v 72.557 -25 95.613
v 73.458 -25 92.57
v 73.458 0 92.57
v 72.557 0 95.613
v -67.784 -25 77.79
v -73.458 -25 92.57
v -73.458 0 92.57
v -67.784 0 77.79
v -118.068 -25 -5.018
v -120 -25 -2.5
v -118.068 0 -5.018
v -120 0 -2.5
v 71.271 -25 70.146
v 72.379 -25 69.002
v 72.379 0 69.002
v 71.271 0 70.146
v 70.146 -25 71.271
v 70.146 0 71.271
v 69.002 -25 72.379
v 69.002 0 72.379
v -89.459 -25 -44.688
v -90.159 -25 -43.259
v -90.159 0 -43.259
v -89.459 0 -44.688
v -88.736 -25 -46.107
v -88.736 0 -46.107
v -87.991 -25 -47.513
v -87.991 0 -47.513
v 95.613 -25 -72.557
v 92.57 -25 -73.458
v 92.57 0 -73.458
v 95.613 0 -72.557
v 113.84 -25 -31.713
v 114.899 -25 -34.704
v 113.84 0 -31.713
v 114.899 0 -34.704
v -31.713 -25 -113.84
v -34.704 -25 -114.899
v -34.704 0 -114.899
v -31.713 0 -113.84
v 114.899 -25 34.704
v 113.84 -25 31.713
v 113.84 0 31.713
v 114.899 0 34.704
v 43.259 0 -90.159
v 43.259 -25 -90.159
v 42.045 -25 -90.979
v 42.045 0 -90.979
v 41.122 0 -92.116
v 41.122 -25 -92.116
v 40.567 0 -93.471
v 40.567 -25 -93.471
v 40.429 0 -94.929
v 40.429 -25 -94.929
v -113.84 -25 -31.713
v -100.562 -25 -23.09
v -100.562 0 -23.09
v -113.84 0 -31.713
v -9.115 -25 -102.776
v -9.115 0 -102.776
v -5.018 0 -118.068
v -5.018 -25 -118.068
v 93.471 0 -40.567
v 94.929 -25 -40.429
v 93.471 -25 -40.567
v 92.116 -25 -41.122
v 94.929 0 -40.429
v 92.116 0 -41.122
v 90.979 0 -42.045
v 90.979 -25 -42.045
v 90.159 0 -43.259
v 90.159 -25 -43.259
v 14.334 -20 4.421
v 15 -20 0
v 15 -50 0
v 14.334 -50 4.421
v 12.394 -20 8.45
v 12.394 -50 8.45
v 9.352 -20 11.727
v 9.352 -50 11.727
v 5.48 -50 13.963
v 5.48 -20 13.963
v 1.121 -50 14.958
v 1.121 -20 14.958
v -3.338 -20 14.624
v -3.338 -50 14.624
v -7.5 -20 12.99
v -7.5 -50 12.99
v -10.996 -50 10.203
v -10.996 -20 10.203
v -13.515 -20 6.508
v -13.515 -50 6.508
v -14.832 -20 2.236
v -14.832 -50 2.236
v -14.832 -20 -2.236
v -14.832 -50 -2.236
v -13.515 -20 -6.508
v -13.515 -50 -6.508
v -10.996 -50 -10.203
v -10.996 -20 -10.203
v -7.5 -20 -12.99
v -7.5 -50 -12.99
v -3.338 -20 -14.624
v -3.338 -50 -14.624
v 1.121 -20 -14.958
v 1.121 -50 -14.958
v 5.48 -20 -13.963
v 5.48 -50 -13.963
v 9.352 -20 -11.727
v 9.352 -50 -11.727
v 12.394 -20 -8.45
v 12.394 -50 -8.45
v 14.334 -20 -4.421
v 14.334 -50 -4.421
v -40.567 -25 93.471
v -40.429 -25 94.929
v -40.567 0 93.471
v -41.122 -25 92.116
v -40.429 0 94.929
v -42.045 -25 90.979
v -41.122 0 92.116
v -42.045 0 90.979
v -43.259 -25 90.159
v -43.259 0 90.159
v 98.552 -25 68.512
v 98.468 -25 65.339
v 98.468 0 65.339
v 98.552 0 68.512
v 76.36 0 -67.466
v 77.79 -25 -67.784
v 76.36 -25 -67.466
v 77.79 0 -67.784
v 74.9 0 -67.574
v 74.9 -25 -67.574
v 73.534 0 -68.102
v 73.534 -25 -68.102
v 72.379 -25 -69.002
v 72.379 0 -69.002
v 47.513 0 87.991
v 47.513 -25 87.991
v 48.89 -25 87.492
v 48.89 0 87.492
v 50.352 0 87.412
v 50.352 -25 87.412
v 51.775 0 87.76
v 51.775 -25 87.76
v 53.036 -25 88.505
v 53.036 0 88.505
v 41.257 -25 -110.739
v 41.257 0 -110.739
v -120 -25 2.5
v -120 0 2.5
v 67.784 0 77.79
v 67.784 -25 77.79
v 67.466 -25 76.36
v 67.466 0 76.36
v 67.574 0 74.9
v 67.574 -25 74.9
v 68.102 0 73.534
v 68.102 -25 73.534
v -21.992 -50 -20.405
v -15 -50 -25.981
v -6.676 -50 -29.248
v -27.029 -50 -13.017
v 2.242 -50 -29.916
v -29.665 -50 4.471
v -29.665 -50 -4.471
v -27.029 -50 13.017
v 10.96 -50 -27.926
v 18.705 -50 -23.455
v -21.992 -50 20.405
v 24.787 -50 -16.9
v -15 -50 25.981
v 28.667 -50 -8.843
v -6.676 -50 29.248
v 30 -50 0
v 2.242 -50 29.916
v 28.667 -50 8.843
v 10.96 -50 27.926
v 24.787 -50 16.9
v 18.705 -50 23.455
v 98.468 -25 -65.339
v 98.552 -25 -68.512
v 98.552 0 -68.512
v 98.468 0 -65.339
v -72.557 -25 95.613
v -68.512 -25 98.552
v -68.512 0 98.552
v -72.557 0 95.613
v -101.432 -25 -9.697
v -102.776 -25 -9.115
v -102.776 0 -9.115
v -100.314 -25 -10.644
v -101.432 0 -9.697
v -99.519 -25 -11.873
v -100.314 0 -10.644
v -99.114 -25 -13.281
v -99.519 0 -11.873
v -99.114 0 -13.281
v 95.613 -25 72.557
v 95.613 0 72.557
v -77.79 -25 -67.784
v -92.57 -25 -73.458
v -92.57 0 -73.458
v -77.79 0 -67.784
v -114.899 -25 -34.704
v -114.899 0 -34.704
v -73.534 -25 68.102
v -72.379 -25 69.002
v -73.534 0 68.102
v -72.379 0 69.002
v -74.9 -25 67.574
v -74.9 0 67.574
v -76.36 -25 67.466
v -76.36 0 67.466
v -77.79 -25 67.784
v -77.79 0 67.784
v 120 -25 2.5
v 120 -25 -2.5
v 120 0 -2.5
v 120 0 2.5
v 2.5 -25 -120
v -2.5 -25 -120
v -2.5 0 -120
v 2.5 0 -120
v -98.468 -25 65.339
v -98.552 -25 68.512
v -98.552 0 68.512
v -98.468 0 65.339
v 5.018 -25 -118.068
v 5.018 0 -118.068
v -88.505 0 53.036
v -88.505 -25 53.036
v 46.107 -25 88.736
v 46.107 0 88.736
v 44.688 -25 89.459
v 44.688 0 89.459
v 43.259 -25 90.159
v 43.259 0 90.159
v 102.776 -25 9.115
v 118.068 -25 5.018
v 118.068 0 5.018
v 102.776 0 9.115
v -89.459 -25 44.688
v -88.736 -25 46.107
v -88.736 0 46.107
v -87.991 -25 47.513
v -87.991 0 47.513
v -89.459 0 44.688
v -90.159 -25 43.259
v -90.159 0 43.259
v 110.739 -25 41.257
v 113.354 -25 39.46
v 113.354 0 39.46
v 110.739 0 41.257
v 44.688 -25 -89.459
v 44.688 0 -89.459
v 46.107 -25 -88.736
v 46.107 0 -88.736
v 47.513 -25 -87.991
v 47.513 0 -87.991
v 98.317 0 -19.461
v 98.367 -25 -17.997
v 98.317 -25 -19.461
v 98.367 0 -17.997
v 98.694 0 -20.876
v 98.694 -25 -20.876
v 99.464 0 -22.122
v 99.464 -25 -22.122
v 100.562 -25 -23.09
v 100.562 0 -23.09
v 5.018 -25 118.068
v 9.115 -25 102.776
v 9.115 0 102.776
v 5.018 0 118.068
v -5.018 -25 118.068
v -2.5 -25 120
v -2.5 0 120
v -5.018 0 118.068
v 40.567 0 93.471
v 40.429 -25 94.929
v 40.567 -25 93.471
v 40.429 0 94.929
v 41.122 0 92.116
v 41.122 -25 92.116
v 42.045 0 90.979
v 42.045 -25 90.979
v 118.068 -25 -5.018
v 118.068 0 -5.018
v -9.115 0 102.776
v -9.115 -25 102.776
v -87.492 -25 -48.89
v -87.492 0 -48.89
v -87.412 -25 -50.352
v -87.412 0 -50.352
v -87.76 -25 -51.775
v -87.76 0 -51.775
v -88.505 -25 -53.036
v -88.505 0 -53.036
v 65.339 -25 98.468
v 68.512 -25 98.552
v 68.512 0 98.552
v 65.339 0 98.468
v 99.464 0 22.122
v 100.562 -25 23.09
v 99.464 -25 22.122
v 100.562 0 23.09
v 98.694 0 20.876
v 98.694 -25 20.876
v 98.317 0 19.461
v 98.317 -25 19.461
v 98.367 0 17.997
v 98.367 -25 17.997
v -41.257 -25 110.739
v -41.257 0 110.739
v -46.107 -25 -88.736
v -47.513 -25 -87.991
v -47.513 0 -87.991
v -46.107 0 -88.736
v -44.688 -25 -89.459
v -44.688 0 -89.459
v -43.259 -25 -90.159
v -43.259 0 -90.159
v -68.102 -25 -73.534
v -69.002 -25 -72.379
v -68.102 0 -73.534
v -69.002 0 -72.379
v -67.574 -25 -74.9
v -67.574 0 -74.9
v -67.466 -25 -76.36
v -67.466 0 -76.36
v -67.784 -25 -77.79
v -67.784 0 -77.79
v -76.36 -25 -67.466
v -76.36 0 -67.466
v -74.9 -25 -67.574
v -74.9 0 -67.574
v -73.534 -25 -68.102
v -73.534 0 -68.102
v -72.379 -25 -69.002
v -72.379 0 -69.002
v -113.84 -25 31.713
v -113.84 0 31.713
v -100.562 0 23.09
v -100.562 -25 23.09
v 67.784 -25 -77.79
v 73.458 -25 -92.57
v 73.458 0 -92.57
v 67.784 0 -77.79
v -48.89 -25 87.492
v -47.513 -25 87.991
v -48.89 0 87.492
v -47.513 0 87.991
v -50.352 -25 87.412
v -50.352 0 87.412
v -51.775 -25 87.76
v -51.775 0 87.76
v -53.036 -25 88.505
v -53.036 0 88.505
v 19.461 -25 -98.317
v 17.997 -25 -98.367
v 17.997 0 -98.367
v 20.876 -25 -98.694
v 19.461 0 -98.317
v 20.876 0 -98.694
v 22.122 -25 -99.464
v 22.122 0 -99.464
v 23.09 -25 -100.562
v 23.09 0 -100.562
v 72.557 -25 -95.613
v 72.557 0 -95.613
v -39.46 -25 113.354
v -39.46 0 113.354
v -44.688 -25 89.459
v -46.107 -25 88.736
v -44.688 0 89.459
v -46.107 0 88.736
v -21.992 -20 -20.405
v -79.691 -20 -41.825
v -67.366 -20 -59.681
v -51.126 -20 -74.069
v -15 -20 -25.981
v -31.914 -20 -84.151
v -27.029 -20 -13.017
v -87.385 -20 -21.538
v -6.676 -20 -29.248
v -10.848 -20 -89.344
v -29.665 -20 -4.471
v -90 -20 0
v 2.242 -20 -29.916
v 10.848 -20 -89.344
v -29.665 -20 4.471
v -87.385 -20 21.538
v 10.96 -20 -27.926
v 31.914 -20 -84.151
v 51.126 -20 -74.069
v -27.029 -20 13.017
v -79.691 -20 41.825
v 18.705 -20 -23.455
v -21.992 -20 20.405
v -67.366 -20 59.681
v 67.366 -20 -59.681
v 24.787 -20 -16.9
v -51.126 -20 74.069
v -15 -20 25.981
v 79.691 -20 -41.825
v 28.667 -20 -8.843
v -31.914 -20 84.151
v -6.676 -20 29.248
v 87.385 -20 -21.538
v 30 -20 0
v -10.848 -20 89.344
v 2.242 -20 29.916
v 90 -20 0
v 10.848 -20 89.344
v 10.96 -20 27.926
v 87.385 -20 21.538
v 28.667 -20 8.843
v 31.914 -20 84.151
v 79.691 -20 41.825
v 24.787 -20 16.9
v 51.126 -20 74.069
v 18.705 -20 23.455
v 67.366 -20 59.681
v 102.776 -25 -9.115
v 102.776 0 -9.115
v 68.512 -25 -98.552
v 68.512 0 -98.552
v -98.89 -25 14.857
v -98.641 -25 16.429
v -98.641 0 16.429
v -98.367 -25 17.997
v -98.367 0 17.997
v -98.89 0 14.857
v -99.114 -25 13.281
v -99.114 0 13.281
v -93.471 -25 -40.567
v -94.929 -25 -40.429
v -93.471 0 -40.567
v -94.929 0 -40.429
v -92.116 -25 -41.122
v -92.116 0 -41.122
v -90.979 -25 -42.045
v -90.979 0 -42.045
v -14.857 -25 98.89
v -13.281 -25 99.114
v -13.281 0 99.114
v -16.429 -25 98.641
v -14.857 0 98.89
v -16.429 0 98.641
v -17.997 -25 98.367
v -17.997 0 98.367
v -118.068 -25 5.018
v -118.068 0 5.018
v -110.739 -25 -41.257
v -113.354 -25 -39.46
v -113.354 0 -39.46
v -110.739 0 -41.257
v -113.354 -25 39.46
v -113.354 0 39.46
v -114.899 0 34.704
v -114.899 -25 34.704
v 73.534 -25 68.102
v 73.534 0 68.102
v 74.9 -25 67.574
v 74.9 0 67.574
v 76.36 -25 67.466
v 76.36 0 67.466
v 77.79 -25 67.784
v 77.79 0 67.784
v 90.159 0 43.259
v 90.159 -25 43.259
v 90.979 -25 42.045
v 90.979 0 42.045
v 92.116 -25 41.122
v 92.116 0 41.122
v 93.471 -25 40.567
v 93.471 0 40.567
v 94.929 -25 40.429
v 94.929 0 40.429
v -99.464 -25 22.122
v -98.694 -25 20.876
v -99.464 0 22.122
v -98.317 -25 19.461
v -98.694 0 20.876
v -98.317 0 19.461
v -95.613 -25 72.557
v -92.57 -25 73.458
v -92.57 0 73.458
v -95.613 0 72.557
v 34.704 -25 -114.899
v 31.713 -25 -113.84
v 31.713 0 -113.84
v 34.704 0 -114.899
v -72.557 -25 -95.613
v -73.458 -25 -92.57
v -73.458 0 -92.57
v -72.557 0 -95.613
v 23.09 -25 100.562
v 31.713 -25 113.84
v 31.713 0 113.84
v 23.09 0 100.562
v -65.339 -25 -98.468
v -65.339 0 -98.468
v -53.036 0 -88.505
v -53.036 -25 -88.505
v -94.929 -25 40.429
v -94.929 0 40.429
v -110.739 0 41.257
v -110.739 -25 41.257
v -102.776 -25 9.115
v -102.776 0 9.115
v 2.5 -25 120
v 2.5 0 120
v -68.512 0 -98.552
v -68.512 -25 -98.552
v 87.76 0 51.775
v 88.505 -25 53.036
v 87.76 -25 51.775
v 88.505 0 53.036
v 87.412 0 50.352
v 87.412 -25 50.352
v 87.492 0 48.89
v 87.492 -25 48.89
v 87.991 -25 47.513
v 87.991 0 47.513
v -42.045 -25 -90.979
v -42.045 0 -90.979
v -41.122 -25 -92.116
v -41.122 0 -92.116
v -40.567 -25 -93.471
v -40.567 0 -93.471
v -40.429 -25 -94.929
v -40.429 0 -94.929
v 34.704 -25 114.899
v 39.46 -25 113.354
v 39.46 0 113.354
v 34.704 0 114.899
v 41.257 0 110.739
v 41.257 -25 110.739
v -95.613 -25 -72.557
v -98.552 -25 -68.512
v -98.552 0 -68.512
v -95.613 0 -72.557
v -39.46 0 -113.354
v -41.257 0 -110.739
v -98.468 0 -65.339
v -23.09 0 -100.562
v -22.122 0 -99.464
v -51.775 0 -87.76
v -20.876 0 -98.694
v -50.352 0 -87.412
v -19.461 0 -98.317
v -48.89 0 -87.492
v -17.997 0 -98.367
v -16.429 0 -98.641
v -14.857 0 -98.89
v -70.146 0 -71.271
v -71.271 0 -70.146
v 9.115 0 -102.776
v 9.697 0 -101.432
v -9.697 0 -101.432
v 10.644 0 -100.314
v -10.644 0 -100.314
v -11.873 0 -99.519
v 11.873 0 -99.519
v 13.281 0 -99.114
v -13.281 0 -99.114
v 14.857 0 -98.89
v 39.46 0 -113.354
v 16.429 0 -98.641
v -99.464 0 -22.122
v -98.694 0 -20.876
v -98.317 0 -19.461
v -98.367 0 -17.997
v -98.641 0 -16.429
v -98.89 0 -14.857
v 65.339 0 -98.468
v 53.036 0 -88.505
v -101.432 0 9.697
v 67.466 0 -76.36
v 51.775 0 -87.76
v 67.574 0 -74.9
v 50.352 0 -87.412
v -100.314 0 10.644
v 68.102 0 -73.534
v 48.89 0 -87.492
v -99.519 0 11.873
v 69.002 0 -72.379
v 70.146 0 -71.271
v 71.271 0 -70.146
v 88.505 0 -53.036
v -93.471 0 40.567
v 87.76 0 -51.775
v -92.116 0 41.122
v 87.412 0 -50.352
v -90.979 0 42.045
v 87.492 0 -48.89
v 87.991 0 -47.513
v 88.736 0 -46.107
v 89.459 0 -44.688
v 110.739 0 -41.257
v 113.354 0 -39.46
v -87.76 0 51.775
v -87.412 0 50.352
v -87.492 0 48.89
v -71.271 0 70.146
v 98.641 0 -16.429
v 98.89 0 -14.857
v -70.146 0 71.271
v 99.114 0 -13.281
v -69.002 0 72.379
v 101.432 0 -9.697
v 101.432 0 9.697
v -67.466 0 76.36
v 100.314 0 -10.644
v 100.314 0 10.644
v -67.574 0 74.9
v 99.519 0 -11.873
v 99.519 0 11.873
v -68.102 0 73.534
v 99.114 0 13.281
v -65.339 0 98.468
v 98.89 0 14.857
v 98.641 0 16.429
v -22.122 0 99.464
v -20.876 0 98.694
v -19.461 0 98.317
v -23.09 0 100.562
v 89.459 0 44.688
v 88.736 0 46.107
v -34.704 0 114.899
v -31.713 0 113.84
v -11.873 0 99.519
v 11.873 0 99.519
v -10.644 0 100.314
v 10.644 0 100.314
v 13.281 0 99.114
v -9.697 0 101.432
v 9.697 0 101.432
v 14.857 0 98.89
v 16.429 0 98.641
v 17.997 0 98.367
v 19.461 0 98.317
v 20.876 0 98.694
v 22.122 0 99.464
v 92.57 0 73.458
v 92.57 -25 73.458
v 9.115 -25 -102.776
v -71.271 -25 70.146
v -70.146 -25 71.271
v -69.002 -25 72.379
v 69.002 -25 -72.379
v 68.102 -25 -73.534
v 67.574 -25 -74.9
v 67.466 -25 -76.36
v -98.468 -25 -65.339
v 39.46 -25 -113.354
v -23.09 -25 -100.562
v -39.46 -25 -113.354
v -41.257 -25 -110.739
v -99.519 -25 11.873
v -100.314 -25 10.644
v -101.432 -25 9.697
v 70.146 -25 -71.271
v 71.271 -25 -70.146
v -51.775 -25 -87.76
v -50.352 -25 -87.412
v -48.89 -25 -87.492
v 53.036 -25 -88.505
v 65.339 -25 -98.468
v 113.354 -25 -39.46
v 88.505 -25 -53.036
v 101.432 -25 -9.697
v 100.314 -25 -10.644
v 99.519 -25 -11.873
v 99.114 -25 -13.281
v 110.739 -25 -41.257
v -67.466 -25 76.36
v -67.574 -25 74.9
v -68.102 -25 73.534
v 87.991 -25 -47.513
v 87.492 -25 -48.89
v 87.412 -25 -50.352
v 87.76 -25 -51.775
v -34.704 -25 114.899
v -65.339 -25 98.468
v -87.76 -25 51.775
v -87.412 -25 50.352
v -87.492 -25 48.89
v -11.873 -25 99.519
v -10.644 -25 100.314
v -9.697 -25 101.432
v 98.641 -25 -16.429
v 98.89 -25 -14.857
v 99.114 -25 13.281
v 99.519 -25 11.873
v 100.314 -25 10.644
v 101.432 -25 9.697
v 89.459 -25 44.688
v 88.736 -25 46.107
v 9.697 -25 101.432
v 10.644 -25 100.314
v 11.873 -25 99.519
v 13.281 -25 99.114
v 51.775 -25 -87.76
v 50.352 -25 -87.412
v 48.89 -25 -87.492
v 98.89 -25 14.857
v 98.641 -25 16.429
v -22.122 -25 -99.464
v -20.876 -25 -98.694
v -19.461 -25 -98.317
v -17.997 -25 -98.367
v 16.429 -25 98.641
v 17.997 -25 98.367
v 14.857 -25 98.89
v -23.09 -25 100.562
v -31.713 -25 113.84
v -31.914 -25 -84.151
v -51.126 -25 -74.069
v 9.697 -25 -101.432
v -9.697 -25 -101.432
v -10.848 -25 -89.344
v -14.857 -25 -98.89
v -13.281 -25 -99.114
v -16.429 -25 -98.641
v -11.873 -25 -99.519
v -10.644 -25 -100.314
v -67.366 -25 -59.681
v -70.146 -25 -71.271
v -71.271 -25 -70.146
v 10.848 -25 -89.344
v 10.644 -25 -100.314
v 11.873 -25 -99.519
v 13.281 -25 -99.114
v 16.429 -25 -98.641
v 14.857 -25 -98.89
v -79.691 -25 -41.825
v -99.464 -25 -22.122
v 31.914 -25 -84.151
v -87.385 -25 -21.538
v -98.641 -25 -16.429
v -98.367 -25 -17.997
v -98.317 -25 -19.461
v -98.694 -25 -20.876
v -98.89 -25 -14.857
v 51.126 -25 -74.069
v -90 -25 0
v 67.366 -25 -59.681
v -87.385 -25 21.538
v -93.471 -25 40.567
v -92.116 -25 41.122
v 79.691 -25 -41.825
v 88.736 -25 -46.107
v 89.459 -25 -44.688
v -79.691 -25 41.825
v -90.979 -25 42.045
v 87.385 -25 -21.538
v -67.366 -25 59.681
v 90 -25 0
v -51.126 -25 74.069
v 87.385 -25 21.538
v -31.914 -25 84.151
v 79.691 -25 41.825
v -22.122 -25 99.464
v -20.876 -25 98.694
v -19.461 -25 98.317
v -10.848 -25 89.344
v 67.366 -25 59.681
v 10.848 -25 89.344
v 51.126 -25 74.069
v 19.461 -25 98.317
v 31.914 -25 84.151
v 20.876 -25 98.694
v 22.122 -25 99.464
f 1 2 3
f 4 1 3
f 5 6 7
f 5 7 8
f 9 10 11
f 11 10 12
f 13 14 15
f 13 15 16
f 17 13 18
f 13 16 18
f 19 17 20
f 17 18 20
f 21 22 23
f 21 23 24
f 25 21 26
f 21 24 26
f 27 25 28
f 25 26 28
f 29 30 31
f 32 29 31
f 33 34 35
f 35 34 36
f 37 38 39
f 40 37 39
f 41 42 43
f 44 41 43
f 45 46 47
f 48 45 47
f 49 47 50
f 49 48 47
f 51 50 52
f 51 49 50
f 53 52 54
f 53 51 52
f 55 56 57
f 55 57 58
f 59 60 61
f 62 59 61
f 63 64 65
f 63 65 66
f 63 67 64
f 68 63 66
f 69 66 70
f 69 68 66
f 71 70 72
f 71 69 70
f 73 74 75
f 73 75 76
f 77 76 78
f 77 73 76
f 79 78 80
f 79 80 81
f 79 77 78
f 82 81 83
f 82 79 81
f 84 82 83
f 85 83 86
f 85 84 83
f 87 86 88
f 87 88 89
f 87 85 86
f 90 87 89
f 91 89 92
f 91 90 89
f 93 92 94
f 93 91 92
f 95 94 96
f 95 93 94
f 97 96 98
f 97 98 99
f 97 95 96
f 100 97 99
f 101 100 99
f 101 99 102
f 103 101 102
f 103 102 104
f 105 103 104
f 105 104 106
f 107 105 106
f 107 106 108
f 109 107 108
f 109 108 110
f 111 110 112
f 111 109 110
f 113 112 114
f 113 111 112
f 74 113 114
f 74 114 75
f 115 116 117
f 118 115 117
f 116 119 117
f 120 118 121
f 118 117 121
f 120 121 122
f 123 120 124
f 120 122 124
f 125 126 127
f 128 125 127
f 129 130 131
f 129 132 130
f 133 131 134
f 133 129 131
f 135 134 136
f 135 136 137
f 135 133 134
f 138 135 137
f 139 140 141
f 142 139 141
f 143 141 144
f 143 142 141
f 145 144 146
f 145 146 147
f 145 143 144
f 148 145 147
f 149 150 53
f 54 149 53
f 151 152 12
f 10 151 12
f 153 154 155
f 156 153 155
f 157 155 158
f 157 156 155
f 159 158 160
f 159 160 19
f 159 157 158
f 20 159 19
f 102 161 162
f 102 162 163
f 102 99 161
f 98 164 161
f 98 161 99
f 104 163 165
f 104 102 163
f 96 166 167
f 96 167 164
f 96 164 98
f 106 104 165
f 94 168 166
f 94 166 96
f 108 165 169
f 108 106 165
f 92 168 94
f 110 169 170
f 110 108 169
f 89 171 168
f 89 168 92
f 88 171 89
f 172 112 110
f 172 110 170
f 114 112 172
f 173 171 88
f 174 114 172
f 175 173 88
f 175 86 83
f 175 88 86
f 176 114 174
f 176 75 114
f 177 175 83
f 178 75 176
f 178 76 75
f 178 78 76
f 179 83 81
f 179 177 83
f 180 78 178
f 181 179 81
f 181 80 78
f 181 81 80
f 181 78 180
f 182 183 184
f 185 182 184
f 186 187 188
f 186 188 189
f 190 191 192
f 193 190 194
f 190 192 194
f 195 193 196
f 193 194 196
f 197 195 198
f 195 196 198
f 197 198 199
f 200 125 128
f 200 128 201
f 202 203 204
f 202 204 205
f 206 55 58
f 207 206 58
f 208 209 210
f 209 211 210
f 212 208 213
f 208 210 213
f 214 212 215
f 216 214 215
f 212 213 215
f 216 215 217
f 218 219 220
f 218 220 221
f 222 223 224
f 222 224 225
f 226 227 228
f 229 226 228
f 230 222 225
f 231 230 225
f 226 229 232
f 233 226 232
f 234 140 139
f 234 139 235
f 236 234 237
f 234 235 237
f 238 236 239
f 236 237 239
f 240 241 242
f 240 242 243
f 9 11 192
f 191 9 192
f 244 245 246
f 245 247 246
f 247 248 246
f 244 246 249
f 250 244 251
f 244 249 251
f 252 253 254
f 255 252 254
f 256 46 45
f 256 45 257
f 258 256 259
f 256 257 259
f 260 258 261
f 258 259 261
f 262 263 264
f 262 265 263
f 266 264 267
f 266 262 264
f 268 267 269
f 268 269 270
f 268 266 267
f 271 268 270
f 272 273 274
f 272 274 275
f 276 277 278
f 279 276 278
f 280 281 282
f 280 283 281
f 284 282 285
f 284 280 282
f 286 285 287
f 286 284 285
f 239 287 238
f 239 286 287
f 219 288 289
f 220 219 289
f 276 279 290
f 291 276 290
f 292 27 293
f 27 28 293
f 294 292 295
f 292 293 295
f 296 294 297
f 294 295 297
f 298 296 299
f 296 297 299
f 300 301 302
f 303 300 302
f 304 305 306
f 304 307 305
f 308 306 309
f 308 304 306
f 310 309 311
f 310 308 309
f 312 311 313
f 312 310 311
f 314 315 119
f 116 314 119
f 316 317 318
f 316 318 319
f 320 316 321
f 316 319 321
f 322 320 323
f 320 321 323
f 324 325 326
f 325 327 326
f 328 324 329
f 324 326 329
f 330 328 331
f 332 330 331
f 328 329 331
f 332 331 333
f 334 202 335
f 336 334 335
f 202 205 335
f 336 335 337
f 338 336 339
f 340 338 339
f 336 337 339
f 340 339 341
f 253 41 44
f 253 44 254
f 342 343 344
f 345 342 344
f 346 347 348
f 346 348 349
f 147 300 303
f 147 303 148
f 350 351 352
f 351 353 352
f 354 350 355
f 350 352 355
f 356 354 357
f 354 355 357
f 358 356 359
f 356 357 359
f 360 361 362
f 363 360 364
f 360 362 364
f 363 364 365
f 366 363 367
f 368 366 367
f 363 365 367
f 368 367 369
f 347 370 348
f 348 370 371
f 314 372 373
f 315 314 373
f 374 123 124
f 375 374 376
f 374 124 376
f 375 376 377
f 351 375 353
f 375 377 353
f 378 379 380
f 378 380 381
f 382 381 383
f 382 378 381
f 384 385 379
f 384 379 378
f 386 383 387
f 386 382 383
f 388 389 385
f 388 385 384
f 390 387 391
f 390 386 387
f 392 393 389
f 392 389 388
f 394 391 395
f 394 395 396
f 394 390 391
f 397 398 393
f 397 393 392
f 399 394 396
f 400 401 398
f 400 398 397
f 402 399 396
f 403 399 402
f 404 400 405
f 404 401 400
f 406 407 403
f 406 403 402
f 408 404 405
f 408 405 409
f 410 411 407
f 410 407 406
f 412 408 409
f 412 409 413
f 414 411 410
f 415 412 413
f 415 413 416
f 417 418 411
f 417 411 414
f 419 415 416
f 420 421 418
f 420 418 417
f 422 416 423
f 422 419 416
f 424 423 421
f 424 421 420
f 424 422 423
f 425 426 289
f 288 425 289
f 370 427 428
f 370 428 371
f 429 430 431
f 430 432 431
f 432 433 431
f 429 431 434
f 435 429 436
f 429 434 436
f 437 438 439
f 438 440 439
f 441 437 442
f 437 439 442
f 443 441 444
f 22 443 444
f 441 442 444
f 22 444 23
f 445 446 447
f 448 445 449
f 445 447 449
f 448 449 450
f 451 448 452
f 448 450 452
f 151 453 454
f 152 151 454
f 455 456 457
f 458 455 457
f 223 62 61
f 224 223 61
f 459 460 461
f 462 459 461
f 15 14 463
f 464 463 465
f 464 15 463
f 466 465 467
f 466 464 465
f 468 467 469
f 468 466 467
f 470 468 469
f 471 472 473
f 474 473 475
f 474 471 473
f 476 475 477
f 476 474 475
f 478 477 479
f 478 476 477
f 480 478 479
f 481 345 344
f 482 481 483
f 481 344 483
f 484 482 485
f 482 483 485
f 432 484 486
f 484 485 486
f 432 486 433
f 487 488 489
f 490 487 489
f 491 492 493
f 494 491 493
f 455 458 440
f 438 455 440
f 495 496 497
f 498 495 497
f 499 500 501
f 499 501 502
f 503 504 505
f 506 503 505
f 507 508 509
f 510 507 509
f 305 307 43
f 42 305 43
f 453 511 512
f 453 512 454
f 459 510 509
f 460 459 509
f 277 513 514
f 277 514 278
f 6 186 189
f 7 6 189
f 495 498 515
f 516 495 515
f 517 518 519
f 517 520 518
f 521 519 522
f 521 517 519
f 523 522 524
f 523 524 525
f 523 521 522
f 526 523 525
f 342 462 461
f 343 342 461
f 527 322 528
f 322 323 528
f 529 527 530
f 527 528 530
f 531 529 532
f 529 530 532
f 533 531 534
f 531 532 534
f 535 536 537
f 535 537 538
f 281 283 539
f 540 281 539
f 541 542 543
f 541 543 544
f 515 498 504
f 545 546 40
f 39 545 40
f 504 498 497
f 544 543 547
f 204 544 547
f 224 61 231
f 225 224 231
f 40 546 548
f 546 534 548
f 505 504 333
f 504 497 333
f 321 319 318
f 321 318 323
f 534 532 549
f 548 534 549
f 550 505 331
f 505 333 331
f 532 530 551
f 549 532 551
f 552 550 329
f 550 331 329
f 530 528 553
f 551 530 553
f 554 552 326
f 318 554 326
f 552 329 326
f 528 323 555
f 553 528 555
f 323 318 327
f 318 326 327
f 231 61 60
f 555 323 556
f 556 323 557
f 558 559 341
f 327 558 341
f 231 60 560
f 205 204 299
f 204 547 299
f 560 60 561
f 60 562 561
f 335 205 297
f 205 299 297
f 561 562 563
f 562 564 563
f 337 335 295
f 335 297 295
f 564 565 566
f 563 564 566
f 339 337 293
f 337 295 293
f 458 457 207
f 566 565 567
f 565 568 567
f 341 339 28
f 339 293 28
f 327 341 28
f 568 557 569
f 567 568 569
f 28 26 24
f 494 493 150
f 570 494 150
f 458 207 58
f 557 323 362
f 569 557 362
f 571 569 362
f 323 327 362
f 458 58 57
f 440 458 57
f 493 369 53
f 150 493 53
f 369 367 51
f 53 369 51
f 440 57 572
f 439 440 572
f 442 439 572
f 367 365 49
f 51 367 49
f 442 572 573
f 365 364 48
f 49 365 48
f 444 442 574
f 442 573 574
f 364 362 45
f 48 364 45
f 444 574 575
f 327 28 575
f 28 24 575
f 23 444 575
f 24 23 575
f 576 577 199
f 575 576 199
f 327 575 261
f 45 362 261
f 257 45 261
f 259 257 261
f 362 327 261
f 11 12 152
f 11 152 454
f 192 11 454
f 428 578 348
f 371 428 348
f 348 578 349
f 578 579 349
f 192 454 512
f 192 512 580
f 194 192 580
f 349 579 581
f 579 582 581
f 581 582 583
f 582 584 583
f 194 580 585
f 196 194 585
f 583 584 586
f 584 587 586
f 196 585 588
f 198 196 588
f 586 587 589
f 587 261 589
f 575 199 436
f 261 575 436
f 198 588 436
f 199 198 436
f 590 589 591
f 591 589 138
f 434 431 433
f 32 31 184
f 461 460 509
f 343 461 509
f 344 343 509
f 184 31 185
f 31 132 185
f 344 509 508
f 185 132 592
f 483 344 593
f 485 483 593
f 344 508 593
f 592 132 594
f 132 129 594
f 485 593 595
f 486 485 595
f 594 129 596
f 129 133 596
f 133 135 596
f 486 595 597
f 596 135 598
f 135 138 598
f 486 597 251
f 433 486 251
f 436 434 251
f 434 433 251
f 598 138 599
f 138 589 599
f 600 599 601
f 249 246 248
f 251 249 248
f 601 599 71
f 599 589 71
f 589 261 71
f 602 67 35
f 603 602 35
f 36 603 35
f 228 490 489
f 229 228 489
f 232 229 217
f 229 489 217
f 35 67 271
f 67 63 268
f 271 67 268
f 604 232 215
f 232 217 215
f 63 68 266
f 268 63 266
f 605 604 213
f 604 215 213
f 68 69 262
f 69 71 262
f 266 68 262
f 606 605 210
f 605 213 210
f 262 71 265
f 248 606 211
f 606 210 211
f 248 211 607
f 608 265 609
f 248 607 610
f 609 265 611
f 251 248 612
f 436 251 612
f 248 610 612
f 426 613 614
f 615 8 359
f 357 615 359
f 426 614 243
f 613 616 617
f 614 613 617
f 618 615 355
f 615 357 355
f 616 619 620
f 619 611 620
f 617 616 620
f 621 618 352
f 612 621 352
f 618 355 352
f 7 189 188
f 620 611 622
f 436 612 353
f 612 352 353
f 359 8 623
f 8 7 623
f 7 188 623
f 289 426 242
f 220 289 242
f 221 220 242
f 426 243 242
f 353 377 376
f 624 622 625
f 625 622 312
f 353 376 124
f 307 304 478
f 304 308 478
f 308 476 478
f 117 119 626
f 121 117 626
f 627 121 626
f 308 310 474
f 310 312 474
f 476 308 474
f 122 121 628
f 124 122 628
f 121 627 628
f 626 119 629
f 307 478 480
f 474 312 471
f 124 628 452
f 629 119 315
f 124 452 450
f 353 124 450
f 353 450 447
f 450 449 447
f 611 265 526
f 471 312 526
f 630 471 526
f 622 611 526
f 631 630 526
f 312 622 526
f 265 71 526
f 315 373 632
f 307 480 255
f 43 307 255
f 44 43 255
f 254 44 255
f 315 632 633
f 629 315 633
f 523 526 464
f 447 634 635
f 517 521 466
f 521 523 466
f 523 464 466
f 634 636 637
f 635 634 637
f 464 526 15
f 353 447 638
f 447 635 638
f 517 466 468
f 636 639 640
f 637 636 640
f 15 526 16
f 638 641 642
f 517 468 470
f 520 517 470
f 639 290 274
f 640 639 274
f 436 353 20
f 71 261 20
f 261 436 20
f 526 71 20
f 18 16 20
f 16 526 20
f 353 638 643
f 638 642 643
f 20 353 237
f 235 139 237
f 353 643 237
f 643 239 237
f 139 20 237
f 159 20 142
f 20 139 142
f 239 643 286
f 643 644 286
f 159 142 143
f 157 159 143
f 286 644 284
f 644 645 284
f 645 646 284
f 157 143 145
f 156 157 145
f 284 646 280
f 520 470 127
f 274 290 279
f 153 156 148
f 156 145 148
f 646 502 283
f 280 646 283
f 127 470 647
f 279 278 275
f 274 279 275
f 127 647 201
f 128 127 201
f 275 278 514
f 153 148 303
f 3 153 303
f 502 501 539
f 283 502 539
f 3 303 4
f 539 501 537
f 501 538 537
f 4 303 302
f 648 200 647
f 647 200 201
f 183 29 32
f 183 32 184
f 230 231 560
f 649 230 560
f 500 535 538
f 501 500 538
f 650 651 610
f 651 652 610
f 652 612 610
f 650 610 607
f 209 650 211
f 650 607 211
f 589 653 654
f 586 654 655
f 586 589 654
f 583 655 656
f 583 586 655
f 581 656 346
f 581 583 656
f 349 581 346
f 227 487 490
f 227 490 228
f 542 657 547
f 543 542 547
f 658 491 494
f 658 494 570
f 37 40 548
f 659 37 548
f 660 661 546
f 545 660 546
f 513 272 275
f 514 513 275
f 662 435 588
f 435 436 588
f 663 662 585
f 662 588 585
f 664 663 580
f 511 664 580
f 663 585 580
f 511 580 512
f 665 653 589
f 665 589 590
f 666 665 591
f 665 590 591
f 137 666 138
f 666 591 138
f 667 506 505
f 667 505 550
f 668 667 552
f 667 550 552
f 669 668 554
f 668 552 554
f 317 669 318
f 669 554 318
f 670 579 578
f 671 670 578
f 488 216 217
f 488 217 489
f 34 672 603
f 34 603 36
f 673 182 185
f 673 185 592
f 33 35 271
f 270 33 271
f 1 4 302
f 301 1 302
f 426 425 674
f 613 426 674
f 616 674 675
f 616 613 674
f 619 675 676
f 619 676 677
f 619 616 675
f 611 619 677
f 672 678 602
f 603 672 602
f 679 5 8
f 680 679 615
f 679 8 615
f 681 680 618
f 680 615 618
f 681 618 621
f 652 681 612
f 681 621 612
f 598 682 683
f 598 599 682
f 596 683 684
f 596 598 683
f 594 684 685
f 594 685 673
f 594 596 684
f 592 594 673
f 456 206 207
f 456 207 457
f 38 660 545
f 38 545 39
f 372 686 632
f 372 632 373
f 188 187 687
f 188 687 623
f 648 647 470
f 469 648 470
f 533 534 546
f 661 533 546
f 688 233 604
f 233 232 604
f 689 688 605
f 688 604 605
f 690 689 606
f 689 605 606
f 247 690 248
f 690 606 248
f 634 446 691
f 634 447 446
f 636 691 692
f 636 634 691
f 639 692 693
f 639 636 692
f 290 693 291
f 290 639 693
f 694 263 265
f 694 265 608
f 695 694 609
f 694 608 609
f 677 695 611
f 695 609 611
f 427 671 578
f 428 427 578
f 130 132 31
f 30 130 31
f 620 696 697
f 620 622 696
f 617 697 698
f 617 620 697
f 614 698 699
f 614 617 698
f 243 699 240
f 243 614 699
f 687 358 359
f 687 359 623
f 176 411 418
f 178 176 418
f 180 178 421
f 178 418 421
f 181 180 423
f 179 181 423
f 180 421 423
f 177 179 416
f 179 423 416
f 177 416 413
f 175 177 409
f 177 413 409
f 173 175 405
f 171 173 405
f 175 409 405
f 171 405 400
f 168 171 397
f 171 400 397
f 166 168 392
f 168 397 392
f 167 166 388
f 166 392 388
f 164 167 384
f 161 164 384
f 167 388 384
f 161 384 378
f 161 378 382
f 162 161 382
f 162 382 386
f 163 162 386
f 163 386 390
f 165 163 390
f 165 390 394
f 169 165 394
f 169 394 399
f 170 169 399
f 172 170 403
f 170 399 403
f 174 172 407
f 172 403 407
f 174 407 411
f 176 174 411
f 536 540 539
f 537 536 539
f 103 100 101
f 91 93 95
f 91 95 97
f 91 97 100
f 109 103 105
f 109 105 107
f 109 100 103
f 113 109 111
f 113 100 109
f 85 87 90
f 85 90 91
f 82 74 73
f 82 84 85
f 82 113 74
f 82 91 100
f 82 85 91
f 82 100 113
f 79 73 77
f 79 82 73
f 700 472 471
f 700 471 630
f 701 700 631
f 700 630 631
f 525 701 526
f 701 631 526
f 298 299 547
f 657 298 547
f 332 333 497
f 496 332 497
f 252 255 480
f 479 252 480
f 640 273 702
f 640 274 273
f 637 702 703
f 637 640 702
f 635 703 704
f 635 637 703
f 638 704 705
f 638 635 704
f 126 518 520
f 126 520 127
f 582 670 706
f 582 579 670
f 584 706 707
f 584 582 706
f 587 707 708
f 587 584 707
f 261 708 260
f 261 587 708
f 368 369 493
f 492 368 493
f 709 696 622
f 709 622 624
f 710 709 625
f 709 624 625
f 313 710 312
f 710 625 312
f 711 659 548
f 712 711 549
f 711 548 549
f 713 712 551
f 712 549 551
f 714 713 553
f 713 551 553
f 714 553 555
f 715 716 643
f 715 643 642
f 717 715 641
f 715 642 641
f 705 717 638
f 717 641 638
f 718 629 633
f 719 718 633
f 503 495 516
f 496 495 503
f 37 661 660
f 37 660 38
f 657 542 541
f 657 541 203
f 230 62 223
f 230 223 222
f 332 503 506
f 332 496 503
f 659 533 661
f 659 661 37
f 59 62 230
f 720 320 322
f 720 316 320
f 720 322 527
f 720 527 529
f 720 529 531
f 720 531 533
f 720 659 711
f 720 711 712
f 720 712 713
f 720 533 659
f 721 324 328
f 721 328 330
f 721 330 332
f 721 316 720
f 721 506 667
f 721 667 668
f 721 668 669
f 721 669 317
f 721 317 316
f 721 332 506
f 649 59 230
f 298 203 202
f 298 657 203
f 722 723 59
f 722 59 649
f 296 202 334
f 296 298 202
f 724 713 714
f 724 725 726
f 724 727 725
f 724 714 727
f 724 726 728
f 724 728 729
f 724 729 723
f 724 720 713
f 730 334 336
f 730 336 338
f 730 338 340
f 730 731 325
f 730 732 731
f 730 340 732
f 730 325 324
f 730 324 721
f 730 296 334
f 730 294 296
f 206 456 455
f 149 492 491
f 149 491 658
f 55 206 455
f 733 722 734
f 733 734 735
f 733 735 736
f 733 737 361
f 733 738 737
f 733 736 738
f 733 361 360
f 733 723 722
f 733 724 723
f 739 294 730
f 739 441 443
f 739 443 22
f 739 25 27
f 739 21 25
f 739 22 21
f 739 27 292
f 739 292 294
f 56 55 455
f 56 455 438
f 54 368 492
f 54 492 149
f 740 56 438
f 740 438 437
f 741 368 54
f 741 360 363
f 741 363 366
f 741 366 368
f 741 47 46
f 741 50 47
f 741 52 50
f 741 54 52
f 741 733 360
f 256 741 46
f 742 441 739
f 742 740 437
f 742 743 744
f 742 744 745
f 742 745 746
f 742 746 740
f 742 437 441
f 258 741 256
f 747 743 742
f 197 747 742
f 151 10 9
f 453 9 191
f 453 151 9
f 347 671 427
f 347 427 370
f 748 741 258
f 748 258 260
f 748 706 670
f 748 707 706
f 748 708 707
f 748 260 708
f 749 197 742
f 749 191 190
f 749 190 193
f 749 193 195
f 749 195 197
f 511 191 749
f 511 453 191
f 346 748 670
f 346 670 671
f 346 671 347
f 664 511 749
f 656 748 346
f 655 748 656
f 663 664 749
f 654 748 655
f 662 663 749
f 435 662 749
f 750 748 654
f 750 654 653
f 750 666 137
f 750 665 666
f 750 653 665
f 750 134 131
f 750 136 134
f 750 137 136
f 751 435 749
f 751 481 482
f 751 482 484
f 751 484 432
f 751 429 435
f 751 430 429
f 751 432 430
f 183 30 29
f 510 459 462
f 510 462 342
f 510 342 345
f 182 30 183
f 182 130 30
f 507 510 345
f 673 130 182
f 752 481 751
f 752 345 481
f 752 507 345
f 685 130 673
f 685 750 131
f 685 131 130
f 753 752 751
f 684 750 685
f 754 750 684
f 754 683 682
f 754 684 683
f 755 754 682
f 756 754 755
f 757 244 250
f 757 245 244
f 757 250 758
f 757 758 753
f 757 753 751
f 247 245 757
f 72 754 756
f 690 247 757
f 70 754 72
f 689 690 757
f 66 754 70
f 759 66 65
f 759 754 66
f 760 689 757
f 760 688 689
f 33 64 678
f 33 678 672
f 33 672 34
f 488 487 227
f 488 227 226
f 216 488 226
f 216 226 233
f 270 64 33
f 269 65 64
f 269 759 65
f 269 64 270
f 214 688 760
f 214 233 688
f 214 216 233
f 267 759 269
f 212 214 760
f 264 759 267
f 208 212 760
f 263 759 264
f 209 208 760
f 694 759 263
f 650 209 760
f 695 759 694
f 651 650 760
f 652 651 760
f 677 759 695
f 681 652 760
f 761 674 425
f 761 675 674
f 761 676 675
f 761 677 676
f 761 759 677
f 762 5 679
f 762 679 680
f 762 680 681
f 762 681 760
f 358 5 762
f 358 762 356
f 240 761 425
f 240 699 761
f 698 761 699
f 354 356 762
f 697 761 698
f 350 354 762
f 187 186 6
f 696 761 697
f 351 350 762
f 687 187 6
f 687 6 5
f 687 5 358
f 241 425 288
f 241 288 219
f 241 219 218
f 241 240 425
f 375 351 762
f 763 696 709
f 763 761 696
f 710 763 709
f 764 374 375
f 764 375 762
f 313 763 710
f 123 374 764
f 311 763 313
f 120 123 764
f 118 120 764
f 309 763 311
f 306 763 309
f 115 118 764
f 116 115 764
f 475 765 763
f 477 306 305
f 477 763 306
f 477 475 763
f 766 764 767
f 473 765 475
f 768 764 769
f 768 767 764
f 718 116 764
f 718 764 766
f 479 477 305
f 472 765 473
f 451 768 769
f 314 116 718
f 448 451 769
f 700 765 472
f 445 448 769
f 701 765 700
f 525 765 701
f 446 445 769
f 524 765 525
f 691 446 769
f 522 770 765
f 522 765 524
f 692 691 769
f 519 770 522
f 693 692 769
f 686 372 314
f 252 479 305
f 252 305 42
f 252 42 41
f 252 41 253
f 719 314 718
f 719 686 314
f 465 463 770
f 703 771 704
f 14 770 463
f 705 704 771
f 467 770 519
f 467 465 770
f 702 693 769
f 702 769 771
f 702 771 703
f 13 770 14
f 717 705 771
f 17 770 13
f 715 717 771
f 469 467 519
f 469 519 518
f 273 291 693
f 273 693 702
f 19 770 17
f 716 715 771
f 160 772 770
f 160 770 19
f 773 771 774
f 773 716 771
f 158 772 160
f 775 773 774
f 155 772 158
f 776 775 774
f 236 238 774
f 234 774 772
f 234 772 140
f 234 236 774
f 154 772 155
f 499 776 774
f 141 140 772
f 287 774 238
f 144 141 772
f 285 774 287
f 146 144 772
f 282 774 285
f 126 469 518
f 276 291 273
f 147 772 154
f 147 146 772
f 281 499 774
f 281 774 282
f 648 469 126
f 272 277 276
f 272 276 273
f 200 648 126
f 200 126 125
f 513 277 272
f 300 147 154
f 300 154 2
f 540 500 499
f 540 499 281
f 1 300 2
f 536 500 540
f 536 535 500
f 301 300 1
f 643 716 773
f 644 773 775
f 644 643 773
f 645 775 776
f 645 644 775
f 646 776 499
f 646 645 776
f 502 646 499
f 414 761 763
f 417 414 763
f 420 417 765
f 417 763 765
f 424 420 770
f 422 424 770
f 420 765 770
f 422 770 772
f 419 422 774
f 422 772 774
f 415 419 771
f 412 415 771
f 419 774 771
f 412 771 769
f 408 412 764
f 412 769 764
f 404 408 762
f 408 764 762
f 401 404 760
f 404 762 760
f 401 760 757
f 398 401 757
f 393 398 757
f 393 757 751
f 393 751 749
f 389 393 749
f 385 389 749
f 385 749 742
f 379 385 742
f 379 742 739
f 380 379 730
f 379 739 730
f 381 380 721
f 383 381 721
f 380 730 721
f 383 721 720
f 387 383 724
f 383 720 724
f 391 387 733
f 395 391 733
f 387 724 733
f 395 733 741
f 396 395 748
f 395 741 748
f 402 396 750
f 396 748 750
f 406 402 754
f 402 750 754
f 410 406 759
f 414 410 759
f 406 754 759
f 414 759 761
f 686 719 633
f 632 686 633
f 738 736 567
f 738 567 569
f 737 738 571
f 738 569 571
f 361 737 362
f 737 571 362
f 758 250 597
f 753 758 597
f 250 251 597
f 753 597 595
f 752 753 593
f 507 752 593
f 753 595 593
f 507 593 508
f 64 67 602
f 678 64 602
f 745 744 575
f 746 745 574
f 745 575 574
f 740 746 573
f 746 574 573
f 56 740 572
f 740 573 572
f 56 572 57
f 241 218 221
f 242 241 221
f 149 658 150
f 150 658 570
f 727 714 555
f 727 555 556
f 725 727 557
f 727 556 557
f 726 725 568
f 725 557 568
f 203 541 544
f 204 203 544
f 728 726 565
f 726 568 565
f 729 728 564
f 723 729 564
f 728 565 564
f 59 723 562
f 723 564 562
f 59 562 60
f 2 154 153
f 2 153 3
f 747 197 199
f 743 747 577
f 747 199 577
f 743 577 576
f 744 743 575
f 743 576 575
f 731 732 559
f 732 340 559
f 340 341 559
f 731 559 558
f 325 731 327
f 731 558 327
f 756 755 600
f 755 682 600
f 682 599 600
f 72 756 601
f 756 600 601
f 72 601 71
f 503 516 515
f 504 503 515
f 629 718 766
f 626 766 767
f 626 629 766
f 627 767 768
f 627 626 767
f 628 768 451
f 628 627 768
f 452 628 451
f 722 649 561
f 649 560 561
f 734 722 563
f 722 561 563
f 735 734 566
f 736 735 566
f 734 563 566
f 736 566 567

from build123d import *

# Parameters (mm, degrees)
F0_R            = 100
F1_DEPTH        = 25
F3_DEPTH        = 25
F3_COPIES_COUNT = 20
F4_SIZE         = 2
F5_R            = 5
F6_R            = 90
F7_DEPTH        = 5
F8_R            = 30
F8_R_2          = 15
F9_DEPTH        = 30


# Not quite as in the source:
# - a pattern or mirror of a feature is missing from the dataset's text; its kind, count and spacing are read off the source's solid


with BuildPart() as f1:
    # F0 (on Front) → F1 (new body)
    with BuildSketch(Plane.XZ):
        Circle(F0_R)
    extrude(amount=F1_DEPTH)

    # F2 (on face) → F3 (join)
    with BuildSketch(Plane.XZ.offset(25)):
        Polygon((-4.5, 120), (-9.9931095726, 99.4994359837), (9.9931095726, 99.4994359837), (4.5, 120), align=None)
    f3 = extrude(amount=-F3_DEPTH)

    # F3_copies: F3 ×20 about axis
    f3_copies_axis = Axis((0, 0, 0), (0, 1, 0))
    for i in range(1, F3_COPIES_COUNT):
        add(f3.rotate(f3_copies_axis, i * 360 / F3_COPIES_COUNT))

    # F4
    f4_edges = [f1.edges().sort_by_distance(p)[0] for p in [
        (4.5, -12.5, 120),
        (-4.5, -12.5, 120),
        (-32.802285, -12.5, 115.517358),
        (115.517358, -12.5, 32.802285),
        (120, -12.5, 4.5),
        (120, -12.5, -4.5),
        (115.517358, -12.5, -32.802285),
        (112.736205, -12.5, -41.361794),
        (99.727073, -12.5, -66.893654),
        (94.437006, -12.5, -74.174807),
        (74.174807, -12.5, -94.437006),
        (66.893654, -12.5, -99.727073),
        (41.361794, -12.5, -112.736205),
        (32.802285, -12.5, -115.517358),
        (4.5, -12.5, -120),
        (-4.5, -12.5, -120),
        (-32.802285, -12.5, -115.517358),
        (-41.361794, -12.5, -112.736205),
        (-66.893654, -12.5, -99.727073),
        (-74.174807, -12.5, -94.437006),
        (-94.437006, -12.5, -74.174807),
        (-99.727073, -12.5, -66.893654),
        (-112.736205, -12.5, -41.361794),
        (-115.517358, -12.5, -32.802285),
        (-120, -12.5, -4.5),
        (-120, -12.5, 4.5),
        (-115.517358, -12.5, 32.802285),
        (-112.736205, -12.5, 41.361794),
        (-99.727073, -12.5, 66.893654),
        (-94.437006, -12.5, 74.174807),
        (-74.174807, -12.5, 94.437006),
        (-66.893654, -12.5, 99.727073),
        (32.802285, -12.5, 115.517358),
        (41.361794, -12.5, 112.736205),
        (66.893654, -12.5, 99.727073),
        (74.174807, -12.5, 94.437006),
        (94.437006, -12.5, 74.174807),
        (99.727073, -12.5, 66.893654),
        (112.736205, -12.5, 41.361794),
        (-41.361794, -12.5, 112.736205),
    ]]
    chamfer(f4_edges, length=F4_SIZE)

    # F5
    f5_edges = [f1.edges().sort_by_distance(p)[0] for p in [
        (9.99311, -12.5, 99.499436),
        (-9.99311, -12.5, 99.499436),
        (97.717628, -12.5, 21.243005),
        (99.499436, -12.5, 9.99311),
        (91.541546, -12.5, 40.251029),
        (86.370537, -12.5, 50.399706),
        (99.499436, -12.5, -9.99311),
        (97.717628, -12.5, -21.243005),
        (74.622932, -12.5, 66.568897),
        (66.568897, -12.5, 74.622932),
        (91.541546, -12.5, -40.251029),
        (86.370537, -12.5, -50.399706),
        (50.399706, -12.5, 86.370537),
        (40.251029, -12.5, 91.541546),
        (74.622932, -12.5, -66.568897),
        (66.568897, -12.5, -74.622932),
        (21.243005, -12.5, 97.717628),
        (50.399706, -12.5, -86.370537),
        (40.251029, -12.5, -91.541546),
        (-21.243005, -12.5, 97.717628),
        (21.243005, -12.5, -97.717628),
        (9.99311, -12.5, -99.499436),
        (-40.251029, -12.5, 91.541546),
        (-50.399706, -12.5, 86.370537),
        (-9.99311, -12.5, -99.499436),
        (-21.243005, -12.5, -97.717628),
        (-66.568897, -12.5, 74.622932),
        (-74.622932, -12.5, 66.568897),
        (-40.251029, -12.5, -91.541546),
        (-50.399706, -12.5, -86.370537),
        (-86.370537, -12.5, 50.399706),
        (-91.541546, -12.5, 40.251029),
        (-66.568897, -12.5, -74.622932),
        (-74.622932, -12.5, -66.568897),
        (-97.717628, -12.5, 21.243005),
        (-99.499436, -12.5, 9.99311),
        (-86.370537, -12.5, -50.399706),
        (-91.541546, -12.5, -40.251029),
        (-99.499436, -12.5, -9.99311),
        (-97.717628, -12.5, -21.243005),
    ]]
    fillet(f5_edges, radius=F5_R)

    # F6 (on face) → F7 (cut)
    with BuildSketch(Plane.XZ.offset(25)):
        Circle(F6_R)
    extrude(amount=-F7_DEPTH, mode=Mode.SUBTRACT)

    # F8 (on face) → F9 (join)
    with BuildSketch(Plane.XZ.offset(20)):
        Circle(F8_R)
        Circle(F8_R_2, mode=Mode.SUBTRACT)
    extrude(amount=F9_DEPTH)


solid = f1.part
